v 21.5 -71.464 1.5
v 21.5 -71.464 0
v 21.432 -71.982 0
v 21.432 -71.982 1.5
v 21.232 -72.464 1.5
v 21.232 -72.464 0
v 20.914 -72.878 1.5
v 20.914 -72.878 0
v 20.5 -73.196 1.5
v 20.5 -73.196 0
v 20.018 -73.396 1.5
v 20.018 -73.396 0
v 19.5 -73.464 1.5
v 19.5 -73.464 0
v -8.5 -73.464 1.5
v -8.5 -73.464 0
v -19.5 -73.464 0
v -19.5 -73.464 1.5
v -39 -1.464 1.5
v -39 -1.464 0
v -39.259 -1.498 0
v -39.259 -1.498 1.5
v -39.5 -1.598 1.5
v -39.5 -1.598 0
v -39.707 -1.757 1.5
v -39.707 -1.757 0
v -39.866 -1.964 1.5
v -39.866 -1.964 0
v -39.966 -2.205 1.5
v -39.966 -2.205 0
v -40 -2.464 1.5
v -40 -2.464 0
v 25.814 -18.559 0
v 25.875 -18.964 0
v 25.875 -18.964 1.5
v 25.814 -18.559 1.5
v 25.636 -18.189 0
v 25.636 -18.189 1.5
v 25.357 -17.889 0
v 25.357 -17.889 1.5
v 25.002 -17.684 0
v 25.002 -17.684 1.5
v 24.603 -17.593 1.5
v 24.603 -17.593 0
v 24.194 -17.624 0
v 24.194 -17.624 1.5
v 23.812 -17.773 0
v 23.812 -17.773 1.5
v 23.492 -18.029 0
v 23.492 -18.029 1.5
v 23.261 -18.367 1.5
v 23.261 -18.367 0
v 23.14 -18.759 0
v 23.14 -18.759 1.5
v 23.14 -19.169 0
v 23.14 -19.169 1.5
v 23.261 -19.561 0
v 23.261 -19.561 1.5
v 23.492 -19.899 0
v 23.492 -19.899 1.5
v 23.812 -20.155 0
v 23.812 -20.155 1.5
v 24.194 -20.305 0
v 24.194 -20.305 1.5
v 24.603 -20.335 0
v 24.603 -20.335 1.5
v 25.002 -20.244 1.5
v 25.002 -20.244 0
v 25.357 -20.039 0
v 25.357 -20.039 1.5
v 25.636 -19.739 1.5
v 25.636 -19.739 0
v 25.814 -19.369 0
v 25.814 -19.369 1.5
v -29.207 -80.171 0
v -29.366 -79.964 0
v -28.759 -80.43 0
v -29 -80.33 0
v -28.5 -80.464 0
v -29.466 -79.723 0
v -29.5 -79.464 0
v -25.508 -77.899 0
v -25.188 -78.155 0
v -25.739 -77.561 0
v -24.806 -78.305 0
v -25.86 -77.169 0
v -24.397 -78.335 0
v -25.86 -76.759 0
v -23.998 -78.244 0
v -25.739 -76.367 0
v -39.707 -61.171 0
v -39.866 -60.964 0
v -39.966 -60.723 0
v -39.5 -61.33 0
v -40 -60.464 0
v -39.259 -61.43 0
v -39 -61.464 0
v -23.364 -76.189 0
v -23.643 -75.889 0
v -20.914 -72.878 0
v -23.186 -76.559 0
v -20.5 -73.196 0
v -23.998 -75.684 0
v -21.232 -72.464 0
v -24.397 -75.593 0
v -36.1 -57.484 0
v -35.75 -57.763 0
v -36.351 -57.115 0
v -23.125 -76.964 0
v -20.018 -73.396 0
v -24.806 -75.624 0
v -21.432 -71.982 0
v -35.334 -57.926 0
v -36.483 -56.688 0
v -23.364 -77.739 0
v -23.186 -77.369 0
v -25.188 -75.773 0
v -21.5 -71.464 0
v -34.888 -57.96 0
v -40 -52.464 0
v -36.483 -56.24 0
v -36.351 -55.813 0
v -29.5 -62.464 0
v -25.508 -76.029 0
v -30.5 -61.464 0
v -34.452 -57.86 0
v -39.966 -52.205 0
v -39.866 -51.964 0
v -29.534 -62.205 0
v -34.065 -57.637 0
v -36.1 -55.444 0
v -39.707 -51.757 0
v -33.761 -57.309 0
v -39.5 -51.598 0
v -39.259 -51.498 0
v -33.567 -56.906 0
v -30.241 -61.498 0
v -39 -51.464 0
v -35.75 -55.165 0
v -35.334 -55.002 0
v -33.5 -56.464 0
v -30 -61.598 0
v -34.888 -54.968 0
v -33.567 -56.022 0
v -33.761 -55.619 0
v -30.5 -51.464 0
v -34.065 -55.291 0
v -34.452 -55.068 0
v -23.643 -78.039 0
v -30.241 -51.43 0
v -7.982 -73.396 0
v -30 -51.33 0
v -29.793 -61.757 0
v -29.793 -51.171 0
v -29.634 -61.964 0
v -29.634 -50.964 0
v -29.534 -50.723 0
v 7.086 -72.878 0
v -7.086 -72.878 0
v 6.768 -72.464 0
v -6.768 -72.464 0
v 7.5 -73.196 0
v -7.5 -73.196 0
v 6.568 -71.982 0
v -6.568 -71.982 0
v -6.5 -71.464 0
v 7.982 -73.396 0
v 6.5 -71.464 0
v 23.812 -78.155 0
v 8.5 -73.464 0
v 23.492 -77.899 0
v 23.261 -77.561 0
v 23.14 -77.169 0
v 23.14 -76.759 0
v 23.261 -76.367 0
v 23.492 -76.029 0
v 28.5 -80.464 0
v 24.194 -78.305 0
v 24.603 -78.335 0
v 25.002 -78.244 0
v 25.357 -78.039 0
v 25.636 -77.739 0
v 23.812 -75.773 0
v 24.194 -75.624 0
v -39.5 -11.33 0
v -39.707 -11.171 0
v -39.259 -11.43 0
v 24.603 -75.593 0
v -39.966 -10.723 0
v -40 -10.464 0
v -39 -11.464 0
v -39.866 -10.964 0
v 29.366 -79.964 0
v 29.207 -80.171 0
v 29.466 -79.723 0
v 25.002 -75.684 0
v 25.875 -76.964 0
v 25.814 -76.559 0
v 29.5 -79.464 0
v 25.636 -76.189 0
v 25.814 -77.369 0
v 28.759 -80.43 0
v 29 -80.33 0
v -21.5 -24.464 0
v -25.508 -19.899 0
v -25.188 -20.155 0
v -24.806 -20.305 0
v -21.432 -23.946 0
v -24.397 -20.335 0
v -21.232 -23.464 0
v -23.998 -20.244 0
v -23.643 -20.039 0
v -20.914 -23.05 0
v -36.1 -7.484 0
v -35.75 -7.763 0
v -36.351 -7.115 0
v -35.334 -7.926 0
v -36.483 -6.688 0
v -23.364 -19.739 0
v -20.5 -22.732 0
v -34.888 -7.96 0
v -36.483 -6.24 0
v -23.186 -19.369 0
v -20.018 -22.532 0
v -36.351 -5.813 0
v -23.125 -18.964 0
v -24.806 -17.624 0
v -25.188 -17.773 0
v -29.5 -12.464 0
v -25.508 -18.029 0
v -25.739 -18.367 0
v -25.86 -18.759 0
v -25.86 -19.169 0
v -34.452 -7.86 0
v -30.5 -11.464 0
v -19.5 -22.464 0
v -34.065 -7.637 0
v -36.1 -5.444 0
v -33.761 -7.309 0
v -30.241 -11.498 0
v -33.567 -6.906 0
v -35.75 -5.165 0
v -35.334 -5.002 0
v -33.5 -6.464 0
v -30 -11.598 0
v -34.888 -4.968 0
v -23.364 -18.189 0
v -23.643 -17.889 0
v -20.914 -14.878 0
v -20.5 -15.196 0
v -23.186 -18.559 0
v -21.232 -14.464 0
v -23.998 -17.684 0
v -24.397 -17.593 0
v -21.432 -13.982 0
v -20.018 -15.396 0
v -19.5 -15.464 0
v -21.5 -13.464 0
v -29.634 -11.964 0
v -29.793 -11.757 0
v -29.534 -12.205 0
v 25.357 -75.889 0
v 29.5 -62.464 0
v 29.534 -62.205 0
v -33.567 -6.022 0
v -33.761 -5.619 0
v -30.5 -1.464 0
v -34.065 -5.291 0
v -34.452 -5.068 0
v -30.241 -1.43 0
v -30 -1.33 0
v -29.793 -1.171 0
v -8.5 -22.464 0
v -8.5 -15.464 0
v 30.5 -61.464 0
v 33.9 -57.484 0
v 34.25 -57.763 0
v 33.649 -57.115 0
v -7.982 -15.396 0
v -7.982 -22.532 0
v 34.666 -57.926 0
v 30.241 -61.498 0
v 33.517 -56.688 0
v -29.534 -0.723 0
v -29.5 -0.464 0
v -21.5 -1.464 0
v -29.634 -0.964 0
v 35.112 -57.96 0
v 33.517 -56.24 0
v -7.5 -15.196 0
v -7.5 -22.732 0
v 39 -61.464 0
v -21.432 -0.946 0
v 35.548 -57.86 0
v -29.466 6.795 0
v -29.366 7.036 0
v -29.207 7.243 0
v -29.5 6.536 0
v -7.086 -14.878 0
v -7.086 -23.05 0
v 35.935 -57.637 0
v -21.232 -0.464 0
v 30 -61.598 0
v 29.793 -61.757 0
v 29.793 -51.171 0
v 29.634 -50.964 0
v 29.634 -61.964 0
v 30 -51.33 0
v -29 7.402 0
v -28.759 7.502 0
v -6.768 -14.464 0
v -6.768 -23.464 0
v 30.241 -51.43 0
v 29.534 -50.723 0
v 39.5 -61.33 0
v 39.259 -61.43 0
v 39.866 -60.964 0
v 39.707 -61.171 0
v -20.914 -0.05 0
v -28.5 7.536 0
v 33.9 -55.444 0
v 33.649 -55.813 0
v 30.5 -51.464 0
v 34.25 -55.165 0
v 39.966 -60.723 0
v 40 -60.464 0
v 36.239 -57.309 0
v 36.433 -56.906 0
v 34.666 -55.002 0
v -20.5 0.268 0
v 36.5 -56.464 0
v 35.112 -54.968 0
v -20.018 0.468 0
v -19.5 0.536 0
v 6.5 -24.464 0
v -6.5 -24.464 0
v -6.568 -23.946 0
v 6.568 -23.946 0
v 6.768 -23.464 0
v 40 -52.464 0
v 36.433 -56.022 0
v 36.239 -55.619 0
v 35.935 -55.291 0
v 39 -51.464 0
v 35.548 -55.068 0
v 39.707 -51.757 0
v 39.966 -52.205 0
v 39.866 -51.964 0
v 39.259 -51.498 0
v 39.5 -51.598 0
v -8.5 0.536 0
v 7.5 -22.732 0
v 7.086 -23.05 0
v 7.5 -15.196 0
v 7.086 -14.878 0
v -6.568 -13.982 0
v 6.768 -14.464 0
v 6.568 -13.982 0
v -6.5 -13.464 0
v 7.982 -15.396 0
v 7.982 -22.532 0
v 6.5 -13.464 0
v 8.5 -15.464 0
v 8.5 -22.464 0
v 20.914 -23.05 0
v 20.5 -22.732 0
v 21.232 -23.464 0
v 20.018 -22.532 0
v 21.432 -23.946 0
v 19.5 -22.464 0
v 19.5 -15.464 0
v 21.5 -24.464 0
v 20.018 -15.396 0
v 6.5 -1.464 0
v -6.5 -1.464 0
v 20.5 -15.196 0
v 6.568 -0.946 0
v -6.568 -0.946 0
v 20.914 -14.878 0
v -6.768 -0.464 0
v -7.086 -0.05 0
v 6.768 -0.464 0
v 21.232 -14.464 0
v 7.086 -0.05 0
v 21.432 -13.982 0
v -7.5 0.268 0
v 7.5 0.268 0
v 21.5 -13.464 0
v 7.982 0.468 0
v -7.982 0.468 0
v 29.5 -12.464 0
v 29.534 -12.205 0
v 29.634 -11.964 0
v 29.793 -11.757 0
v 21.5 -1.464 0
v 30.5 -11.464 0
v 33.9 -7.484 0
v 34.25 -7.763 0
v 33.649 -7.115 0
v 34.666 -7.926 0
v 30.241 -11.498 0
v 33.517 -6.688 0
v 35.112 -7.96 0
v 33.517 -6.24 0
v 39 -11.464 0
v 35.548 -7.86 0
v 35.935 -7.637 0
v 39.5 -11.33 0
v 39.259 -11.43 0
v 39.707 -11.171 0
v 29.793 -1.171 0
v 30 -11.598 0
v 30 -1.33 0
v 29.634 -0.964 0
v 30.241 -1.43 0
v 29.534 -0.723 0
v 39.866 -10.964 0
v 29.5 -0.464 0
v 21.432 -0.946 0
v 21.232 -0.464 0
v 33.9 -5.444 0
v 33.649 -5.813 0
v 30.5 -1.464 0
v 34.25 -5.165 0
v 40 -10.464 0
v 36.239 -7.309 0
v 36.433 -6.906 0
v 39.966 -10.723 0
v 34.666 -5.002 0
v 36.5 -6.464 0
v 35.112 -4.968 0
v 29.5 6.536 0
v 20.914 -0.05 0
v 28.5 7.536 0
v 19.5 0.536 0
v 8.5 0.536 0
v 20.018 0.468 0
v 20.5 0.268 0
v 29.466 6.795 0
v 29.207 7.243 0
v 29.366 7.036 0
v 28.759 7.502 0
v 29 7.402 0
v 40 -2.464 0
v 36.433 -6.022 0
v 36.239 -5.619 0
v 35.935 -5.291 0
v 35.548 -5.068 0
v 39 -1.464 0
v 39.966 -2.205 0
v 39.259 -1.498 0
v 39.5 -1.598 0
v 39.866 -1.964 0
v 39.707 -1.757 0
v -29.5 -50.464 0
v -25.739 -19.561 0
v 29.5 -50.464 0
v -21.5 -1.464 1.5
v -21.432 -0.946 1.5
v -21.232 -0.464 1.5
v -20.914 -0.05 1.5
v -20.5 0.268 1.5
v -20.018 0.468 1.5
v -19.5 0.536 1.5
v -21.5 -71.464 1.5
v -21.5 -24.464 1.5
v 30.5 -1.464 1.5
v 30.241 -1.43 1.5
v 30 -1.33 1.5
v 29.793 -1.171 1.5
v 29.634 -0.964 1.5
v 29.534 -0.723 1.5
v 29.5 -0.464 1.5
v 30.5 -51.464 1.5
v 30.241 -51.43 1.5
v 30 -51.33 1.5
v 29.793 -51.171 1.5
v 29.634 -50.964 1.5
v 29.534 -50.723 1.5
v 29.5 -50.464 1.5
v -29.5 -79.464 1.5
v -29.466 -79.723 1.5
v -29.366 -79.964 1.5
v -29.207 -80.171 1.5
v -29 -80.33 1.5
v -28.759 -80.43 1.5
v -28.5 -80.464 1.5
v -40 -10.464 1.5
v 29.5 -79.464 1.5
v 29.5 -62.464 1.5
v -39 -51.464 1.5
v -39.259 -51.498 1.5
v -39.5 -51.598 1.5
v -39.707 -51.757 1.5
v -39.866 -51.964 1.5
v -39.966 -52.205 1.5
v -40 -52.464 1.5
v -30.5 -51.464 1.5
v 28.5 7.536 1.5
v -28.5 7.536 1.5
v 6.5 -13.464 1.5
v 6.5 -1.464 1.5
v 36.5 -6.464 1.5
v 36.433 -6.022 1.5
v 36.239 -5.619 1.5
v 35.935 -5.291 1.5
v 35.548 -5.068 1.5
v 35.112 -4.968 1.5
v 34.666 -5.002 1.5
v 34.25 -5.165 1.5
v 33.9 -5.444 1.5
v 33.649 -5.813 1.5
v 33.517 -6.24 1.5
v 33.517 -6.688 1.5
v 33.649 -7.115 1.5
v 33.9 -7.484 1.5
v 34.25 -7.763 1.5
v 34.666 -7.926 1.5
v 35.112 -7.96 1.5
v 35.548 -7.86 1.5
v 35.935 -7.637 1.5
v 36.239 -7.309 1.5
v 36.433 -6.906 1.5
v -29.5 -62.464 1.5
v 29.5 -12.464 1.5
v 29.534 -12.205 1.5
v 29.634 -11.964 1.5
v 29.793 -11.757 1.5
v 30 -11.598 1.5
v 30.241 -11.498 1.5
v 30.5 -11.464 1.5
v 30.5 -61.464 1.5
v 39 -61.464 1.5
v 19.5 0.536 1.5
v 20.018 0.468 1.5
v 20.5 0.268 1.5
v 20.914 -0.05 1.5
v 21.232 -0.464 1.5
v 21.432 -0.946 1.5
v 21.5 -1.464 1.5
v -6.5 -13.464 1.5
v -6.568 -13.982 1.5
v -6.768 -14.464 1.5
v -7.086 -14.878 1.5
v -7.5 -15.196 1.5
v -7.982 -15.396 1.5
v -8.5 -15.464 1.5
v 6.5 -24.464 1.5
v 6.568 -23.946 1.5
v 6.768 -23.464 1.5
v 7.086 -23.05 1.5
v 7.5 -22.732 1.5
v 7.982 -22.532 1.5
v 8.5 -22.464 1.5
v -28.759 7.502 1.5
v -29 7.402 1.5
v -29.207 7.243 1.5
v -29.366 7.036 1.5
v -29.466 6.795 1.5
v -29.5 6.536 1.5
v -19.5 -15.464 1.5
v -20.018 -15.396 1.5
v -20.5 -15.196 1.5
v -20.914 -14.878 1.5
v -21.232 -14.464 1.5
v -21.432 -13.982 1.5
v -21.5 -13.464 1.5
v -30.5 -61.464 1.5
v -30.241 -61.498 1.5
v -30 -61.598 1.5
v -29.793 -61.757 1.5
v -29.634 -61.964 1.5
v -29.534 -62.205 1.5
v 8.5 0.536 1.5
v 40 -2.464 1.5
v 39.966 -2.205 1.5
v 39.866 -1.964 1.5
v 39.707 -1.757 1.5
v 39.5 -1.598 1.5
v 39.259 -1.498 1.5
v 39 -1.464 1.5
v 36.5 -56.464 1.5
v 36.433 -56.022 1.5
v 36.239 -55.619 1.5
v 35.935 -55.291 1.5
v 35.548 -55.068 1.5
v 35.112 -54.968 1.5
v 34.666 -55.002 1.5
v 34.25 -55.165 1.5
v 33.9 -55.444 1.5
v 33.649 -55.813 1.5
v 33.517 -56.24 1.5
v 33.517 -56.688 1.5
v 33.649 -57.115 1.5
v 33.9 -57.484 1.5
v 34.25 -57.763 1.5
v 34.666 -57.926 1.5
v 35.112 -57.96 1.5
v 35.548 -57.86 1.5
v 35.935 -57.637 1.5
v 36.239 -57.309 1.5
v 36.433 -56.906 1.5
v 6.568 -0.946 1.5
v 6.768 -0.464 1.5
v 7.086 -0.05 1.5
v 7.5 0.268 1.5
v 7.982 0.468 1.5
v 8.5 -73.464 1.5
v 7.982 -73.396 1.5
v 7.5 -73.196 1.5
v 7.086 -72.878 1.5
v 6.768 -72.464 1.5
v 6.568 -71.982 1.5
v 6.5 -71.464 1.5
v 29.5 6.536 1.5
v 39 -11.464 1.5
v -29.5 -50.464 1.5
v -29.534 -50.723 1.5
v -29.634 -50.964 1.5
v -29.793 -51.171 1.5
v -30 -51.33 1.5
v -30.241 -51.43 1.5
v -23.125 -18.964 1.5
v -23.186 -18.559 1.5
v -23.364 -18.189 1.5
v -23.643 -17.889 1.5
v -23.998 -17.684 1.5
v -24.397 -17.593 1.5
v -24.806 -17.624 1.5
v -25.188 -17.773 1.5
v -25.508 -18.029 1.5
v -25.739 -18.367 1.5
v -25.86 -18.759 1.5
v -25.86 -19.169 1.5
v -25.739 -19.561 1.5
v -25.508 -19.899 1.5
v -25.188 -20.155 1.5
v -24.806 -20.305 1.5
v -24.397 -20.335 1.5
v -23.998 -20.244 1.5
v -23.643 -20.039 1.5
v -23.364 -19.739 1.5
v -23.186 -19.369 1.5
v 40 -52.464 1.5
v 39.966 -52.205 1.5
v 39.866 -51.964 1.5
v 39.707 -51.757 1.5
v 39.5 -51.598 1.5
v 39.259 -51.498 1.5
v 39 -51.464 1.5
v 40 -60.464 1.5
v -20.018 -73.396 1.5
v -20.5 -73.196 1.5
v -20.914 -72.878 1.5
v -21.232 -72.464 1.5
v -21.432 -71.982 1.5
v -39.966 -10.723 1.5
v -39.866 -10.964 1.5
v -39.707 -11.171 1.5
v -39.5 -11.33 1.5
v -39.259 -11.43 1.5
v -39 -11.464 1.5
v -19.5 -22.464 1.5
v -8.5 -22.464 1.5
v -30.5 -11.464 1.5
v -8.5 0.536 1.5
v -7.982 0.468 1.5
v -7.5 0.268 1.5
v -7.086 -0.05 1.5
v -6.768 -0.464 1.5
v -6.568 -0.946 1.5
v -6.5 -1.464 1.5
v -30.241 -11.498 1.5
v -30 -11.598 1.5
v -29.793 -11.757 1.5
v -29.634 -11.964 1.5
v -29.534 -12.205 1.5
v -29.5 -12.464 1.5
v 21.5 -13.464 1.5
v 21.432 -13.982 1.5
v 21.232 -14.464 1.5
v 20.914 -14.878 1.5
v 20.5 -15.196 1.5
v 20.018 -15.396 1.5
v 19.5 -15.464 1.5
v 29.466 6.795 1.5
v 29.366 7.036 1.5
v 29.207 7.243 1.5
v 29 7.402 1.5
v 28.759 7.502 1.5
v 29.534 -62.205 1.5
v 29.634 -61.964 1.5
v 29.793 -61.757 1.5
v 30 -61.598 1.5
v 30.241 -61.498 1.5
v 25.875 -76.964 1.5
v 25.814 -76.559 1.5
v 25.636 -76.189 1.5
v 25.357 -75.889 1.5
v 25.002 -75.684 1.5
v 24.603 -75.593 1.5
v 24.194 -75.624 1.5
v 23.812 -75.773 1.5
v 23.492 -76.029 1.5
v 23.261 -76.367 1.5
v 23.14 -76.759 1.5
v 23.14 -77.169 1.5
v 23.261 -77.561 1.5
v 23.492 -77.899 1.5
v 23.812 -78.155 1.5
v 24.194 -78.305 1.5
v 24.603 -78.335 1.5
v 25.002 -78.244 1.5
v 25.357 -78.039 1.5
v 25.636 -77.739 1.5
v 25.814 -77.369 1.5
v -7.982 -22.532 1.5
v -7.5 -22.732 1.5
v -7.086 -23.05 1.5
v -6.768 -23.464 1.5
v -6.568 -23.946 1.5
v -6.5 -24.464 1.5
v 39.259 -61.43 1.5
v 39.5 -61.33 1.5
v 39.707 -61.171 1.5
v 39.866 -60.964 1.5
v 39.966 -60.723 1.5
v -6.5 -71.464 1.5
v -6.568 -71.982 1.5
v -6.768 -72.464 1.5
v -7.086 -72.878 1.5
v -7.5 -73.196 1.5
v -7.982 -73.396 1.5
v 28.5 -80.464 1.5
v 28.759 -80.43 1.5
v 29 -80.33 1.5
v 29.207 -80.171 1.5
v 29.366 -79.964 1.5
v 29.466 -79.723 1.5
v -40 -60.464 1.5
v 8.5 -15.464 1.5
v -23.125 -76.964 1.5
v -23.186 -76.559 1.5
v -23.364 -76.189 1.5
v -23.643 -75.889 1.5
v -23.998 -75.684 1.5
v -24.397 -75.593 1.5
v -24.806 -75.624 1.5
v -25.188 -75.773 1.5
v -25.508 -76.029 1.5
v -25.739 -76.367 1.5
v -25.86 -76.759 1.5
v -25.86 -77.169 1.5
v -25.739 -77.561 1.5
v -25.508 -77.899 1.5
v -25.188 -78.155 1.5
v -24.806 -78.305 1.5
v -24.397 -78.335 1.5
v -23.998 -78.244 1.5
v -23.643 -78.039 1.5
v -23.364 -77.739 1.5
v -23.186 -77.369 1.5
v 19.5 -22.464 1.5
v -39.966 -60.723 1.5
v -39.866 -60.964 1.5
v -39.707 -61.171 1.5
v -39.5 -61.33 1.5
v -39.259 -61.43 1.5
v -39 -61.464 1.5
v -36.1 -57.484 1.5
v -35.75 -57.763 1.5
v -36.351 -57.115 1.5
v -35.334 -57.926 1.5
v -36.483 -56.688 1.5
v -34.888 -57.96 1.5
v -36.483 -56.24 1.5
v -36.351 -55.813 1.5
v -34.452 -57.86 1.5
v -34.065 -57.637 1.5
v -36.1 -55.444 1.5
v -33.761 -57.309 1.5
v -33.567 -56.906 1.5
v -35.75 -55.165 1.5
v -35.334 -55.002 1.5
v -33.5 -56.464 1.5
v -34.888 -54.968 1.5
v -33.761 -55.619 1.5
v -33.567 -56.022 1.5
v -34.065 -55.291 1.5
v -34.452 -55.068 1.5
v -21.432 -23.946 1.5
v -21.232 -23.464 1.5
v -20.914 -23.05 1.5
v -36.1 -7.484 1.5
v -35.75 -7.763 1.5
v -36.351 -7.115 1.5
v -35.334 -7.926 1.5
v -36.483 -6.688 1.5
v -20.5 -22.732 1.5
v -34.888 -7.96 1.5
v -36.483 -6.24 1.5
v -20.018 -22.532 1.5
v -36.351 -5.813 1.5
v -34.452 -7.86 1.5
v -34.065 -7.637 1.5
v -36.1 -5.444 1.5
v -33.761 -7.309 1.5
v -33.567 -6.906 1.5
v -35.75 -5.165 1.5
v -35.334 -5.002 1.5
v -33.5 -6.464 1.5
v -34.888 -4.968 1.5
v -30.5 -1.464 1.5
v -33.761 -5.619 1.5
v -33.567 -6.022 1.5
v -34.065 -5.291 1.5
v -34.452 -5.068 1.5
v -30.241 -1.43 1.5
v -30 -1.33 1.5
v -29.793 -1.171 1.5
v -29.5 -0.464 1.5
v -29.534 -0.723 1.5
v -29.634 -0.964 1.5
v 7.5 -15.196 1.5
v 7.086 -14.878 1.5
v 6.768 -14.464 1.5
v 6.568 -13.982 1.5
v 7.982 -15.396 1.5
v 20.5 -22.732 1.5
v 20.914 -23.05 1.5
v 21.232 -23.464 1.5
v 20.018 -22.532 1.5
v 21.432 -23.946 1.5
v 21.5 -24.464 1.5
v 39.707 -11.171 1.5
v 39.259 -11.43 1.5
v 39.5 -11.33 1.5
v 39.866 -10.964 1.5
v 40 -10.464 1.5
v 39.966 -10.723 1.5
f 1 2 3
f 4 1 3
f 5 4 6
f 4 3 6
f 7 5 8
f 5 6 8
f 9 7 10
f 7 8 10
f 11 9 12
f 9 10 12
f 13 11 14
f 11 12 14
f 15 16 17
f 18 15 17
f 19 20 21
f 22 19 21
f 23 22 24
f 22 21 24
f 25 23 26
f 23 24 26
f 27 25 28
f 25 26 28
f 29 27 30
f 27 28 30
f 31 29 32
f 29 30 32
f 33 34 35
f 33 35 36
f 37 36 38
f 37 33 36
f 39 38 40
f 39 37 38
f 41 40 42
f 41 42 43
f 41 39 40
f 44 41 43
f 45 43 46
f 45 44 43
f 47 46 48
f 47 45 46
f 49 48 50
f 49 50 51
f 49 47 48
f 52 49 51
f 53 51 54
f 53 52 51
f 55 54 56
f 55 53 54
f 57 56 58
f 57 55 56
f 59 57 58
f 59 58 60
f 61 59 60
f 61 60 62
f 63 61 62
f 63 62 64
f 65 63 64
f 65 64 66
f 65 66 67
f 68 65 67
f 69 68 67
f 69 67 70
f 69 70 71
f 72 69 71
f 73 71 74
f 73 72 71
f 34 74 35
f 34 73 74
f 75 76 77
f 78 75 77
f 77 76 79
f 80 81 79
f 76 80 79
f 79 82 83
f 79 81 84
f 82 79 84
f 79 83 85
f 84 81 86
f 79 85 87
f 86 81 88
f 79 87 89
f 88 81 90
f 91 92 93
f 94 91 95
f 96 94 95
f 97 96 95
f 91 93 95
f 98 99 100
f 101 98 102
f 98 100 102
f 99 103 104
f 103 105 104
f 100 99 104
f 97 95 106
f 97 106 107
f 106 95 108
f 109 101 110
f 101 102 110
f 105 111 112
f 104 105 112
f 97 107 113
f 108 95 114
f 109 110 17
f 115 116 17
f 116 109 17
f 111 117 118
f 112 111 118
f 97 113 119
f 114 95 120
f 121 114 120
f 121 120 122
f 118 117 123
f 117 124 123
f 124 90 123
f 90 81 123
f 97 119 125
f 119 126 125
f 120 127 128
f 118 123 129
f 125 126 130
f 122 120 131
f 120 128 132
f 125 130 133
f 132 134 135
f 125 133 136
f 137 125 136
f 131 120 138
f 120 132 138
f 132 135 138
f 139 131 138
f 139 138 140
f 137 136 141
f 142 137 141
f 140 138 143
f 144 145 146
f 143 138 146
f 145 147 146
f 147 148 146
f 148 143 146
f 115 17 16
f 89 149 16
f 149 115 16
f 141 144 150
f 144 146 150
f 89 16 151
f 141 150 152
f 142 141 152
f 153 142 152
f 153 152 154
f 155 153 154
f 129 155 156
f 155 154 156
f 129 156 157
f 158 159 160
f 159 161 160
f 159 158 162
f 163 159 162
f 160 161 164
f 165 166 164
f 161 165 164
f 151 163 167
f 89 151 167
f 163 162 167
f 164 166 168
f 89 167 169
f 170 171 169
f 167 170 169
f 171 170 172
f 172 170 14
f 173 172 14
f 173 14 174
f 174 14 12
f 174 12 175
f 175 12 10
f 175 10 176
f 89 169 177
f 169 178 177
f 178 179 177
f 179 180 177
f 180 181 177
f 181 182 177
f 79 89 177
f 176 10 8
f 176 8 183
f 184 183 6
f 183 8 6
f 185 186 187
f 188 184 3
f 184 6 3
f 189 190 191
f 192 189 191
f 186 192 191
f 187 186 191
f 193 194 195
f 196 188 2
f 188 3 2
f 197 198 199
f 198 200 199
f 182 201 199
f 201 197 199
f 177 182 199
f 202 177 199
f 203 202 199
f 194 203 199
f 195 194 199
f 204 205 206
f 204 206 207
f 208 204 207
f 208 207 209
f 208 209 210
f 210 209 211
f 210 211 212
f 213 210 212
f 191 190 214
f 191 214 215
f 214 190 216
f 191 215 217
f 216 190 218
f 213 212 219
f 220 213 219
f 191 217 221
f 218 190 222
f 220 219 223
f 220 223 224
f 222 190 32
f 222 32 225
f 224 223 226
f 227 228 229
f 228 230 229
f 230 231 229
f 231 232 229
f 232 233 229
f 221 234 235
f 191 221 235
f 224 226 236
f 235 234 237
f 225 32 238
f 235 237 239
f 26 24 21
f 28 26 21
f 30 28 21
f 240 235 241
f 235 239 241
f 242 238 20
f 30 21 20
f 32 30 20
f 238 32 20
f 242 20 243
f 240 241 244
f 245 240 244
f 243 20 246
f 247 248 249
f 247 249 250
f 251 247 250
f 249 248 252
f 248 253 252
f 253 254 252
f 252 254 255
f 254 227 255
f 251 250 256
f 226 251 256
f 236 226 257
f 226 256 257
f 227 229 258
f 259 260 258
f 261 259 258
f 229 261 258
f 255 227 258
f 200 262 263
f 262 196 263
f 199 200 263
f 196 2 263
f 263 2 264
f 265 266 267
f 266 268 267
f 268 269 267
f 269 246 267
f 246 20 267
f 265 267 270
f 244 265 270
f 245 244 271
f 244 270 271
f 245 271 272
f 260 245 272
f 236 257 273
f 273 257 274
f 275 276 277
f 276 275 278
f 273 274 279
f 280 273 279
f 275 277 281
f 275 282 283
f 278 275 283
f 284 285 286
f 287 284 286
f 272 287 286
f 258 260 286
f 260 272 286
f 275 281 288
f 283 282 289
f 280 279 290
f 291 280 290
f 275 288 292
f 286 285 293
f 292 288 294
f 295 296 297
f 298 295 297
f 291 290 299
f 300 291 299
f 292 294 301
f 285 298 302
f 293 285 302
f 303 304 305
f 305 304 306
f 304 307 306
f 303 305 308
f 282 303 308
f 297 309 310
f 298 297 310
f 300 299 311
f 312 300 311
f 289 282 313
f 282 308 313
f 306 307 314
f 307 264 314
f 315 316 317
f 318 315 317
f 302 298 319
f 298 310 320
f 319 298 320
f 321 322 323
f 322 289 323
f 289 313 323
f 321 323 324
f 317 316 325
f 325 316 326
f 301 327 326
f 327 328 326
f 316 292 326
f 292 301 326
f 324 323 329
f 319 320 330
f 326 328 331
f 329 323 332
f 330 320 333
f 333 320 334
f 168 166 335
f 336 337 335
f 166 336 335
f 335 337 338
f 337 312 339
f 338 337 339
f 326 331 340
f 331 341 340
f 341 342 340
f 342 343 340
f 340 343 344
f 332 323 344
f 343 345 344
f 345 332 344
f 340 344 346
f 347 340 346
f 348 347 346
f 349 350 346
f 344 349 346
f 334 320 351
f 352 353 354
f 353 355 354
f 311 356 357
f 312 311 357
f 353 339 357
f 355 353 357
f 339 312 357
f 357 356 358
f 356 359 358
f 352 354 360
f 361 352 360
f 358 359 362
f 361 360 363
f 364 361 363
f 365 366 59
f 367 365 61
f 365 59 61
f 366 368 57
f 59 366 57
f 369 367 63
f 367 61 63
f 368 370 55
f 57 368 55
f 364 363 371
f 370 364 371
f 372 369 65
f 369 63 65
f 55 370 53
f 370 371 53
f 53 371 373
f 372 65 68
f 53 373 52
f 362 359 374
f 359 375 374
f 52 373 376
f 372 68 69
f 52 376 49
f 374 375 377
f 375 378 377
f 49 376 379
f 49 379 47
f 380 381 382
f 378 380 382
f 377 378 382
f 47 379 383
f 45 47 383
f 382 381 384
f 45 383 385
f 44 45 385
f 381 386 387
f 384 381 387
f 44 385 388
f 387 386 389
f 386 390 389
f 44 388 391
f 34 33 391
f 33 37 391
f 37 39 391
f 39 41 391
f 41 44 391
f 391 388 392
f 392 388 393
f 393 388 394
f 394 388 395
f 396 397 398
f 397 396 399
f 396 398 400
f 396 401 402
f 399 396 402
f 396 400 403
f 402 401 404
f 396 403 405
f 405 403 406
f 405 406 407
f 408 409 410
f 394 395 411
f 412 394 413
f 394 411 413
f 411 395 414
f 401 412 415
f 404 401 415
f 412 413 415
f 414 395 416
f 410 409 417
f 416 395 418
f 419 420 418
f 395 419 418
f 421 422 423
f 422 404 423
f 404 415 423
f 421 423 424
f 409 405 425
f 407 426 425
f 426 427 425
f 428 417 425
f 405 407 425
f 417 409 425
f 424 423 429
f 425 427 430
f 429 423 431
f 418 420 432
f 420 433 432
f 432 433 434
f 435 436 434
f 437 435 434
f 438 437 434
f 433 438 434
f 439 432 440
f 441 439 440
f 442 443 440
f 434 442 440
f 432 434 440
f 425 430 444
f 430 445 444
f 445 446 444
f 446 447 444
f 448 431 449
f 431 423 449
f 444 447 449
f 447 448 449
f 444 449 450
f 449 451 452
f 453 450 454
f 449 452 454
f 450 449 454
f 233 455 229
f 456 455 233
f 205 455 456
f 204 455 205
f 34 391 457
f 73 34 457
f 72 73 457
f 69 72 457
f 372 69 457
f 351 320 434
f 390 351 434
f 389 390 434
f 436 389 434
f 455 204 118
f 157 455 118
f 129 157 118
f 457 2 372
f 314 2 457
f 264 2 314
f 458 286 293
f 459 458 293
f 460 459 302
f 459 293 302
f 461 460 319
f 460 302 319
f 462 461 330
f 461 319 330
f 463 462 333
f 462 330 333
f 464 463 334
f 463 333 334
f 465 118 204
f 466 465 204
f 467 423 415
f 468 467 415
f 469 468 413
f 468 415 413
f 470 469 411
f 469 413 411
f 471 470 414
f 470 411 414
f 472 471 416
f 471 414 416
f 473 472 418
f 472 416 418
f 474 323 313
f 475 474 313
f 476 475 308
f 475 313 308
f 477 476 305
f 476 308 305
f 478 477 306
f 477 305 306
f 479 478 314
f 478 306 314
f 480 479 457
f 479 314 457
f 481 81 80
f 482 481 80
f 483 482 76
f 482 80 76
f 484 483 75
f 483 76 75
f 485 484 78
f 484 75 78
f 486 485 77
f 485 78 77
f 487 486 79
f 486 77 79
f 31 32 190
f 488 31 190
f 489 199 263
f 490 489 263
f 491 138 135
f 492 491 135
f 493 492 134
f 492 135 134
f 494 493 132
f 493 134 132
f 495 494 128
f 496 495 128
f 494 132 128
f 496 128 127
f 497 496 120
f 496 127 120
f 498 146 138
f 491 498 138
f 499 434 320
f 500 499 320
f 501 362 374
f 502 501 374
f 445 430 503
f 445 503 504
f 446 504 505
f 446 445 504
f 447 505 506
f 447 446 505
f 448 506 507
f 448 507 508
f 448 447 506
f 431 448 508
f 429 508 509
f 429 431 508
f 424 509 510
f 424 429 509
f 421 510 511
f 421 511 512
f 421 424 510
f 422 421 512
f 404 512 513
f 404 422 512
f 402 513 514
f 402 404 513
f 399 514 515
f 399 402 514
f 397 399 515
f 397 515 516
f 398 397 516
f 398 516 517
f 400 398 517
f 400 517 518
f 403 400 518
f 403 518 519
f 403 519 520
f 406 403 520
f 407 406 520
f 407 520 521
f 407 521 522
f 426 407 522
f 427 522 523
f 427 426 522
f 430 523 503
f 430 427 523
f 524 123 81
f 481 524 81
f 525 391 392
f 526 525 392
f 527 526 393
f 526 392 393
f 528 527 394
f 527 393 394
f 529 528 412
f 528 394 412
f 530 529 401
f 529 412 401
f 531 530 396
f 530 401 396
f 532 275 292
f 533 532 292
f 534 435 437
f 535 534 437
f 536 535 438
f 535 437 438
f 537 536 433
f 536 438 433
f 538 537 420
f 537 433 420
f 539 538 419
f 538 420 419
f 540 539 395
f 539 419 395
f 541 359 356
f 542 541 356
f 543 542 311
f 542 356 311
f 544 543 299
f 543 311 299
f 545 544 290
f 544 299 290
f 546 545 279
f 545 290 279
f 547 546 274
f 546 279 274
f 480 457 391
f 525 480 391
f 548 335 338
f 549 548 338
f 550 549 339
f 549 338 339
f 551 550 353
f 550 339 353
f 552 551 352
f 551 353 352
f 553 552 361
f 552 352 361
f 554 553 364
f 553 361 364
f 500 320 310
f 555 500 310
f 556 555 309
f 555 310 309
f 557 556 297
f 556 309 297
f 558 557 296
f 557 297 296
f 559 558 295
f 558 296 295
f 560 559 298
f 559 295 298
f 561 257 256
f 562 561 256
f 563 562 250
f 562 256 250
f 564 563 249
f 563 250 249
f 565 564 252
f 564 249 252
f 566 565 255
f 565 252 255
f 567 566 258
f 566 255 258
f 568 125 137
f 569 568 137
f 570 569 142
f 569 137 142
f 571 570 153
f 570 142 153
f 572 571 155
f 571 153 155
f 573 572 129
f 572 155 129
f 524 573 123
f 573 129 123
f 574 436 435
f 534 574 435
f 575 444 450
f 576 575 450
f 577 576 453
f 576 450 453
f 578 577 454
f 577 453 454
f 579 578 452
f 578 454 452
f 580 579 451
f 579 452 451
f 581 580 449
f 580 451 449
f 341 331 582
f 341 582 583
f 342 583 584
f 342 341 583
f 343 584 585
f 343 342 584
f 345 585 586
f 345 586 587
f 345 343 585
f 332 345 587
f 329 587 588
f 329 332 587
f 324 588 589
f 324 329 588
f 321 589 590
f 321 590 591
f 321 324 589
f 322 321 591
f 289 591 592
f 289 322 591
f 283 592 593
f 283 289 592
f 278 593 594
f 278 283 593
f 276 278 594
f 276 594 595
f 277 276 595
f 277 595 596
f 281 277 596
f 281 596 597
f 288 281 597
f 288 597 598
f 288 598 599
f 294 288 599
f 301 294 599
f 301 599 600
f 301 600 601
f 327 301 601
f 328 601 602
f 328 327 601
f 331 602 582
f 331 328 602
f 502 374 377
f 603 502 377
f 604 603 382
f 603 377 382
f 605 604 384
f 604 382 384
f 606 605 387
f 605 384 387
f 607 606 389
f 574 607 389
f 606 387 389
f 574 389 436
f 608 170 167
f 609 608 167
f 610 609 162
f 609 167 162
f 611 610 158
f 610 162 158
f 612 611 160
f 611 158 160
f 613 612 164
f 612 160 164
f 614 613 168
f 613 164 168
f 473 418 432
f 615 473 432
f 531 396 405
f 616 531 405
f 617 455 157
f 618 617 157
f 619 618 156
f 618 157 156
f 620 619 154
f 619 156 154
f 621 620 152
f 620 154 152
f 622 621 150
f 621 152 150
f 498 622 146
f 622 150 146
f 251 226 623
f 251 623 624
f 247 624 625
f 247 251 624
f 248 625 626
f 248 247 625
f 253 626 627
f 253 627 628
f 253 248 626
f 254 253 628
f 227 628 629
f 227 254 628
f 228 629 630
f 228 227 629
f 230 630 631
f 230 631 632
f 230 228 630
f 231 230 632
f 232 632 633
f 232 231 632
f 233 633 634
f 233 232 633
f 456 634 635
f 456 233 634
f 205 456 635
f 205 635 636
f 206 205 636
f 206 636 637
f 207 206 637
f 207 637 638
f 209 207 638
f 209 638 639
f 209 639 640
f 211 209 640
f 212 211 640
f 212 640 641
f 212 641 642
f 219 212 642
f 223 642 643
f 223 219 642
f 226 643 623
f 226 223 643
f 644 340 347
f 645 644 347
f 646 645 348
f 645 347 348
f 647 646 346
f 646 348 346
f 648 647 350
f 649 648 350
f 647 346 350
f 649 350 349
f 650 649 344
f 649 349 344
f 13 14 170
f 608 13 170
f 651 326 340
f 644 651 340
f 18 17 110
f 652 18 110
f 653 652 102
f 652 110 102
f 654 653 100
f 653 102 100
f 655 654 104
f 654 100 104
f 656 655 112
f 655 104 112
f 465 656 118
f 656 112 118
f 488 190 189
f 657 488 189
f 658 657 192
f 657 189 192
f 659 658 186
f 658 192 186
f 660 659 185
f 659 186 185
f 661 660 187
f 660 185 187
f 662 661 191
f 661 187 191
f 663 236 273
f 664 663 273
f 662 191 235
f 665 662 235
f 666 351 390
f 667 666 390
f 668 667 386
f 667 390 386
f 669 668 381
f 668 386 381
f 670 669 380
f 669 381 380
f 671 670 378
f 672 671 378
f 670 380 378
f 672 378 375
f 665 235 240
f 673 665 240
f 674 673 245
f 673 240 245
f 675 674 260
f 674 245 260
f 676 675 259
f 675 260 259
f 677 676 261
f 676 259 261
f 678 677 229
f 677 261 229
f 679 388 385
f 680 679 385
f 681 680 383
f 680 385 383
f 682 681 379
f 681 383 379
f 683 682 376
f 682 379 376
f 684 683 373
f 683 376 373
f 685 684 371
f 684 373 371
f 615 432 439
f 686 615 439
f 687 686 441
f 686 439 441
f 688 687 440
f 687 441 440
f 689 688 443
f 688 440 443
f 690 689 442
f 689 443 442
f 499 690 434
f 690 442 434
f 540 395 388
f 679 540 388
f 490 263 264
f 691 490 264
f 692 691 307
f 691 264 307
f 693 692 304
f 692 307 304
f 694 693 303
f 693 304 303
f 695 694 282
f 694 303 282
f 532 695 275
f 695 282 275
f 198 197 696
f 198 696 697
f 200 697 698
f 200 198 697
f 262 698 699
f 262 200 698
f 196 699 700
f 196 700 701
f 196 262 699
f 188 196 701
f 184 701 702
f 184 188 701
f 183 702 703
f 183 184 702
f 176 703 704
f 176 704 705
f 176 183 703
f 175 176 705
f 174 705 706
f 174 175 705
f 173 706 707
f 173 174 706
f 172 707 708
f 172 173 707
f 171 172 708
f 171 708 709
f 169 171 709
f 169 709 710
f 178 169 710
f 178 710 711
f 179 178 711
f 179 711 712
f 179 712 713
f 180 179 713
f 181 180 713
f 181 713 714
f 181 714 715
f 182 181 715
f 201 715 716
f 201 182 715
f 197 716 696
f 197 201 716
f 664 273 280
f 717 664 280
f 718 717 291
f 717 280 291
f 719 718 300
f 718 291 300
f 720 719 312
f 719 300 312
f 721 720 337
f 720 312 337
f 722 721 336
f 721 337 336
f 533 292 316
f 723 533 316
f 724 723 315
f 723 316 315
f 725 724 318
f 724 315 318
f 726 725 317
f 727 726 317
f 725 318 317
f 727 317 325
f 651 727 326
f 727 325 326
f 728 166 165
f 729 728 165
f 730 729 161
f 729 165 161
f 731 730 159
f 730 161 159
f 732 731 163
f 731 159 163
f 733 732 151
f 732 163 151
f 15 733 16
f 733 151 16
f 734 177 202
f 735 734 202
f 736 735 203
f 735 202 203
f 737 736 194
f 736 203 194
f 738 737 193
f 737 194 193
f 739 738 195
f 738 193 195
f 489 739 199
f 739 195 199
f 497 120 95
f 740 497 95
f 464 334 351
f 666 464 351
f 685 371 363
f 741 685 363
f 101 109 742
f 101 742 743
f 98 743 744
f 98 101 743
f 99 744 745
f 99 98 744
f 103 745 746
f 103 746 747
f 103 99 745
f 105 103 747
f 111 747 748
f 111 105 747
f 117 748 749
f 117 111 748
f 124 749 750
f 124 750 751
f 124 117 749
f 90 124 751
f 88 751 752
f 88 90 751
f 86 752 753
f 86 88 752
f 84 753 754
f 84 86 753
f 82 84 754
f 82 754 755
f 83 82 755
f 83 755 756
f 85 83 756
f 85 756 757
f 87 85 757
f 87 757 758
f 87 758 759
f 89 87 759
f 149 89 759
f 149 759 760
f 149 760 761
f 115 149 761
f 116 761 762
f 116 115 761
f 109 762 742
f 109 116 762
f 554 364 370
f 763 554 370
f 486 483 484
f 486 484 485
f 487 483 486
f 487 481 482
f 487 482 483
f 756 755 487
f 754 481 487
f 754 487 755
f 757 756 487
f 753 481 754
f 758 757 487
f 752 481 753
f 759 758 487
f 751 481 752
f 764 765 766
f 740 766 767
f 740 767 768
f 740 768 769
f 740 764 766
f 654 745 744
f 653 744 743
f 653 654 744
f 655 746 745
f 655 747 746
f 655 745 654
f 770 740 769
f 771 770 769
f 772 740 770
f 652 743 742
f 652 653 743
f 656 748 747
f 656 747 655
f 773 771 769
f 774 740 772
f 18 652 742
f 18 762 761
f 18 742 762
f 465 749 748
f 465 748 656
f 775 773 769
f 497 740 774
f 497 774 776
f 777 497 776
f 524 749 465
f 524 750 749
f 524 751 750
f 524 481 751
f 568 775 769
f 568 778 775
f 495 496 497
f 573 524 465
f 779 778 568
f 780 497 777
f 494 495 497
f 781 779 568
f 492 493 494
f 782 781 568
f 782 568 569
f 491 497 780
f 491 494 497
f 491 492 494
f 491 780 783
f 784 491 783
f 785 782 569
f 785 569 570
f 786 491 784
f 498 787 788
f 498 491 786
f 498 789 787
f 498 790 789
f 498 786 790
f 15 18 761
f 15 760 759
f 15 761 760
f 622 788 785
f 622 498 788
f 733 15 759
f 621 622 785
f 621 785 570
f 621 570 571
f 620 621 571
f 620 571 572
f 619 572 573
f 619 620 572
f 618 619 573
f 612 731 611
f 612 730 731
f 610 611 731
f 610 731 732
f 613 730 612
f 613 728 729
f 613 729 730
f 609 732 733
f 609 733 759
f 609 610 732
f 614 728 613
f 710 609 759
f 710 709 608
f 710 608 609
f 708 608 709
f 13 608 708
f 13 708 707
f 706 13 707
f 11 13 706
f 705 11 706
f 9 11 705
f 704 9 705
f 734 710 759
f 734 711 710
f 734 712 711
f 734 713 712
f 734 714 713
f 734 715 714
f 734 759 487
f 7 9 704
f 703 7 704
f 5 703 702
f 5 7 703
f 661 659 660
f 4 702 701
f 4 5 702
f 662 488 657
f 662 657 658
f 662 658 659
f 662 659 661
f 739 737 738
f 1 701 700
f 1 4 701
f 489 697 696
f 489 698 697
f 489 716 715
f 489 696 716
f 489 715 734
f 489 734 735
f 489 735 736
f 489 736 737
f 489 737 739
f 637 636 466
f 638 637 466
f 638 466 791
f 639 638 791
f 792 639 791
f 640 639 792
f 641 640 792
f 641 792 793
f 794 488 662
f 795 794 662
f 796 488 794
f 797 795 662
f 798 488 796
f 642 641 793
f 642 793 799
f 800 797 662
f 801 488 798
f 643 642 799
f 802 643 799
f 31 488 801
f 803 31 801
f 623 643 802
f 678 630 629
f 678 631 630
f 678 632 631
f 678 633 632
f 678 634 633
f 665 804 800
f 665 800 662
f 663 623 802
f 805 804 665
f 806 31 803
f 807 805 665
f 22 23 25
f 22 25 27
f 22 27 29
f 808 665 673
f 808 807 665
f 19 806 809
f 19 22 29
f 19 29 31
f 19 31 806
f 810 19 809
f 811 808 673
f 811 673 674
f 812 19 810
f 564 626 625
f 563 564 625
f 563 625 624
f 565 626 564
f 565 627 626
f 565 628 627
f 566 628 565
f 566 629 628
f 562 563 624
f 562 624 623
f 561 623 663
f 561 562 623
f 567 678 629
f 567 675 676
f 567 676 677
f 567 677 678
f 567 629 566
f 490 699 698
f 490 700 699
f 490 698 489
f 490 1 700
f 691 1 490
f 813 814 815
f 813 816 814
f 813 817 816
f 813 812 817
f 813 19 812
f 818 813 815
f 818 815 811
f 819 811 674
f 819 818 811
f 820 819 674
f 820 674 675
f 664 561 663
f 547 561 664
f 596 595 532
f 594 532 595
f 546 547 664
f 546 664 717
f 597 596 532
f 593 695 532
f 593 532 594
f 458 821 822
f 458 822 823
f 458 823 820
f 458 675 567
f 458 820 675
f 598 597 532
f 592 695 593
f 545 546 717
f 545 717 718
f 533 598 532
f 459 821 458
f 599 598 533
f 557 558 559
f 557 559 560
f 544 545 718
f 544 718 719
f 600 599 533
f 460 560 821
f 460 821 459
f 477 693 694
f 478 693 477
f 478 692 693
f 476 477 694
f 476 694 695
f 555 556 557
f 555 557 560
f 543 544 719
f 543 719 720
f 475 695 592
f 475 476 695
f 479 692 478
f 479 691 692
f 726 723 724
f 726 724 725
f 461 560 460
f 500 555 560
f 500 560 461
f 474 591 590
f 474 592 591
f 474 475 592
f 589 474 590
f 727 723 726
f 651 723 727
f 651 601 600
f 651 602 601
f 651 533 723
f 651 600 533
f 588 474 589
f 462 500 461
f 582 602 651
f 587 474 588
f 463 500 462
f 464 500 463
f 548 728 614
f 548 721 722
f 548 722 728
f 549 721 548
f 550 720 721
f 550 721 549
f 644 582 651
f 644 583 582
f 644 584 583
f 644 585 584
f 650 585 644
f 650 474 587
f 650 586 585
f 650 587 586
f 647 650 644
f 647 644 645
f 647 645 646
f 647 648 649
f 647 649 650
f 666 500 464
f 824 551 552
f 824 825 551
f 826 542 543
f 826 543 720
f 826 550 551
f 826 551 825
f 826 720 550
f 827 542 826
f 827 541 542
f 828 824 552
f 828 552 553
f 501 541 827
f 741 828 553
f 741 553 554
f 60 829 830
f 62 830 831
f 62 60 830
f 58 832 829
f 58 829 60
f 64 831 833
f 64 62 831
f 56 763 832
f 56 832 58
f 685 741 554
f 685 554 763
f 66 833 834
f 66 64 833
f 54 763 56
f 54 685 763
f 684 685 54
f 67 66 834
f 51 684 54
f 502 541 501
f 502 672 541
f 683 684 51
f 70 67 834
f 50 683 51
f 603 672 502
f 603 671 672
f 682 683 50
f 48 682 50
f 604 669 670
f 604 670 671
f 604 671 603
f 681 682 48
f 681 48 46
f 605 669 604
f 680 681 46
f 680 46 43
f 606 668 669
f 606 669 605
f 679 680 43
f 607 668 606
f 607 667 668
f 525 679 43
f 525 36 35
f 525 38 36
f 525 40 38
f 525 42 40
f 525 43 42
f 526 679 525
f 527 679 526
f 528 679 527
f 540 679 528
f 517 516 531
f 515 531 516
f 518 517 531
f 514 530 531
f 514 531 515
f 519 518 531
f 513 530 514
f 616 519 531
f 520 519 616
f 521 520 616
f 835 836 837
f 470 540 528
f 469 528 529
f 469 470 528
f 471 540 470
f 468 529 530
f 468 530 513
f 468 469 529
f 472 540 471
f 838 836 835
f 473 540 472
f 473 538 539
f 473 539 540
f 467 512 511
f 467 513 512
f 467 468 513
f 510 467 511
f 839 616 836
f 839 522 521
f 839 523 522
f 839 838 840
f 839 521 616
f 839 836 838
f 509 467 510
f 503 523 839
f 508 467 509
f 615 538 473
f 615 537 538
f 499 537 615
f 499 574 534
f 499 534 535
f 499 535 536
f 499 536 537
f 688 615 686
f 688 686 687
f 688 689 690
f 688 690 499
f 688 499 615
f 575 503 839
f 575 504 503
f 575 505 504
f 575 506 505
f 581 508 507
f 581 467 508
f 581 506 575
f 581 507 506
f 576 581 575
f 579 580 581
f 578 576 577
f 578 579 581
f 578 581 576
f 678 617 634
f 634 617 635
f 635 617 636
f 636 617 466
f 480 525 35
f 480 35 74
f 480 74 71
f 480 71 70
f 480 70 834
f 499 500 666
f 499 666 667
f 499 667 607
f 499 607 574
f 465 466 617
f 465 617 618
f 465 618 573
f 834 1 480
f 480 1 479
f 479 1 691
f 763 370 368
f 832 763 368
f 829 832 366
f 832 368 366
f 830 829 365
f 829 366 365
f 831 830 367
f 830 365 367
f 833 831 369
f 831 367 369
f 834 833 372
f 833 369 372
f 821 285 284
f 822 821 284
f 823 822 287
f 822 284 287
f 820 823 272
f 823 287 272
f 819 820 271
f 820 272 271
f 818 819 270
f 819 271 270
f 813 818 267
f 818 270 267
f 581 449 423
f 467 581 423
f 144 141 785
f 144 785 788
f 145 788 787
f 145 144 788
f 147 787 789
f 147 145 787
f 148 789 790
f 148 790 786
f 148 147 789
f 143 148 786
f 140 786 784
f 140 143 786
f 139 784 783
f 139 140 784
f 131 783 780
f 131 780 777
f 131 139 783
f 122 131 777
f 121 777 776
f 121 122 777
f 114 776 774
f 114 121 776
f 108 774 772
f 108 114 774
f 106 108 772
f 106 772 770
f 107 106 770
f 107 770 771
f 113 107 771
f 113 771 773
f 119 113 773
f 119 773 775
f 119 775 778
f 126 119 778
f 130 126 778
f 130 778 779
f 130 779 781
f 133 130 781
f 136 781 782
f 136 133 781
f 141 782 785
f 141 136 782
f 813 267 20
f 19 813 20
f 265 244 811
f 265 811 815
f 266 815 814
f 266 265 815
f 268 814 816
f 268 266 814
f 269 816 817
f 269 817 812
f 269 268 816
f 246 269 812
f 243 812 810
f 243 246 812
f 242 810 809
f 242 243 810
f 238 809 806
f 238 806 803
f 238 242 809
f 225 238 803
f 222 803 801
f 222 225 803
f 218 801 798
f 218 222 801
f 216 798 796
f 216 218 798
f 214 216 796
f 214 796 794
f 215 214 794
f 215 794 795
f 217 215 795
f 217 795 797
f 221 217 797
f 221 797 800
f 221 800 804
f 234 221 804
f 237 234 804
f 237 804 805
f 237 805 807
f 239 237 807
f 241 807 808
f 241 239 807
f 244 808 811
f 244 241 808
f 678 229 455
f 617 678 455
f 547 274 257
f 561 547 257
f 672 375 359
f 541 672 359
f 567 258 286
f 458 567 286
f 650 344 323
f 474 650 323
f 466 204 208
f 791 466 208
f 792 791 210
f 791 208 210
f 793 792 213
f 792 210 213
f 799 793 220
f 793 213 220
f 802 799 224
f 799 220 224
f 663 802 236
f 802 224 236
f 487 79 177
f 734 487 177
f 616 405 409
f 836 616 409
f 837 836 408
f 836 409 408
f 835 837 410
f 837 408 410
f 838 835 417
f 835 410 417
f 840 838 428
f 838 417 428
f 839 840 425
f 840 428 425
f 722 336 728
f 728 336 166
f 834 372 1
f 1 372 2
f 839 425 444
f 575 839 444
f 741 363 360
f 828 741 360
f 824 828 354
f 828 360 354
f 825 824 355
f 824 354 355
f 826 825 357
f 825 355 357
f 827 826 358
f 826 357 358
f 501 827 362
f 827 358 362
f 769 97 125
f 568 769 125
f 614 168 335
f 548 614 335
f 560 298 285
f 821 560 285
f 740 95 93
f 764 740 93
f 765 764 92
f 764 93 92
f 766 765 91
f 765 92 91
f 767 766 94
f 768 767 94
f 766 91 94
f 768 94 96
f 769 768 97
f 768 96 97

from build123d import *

# Parameters (mm, degrees)
MODEL_R         = 1.375
MODEL_R_2       = 1.5
EXTRUDE_1_DEPTH = 1.5


with BuildPart() as part:
    # Model → Бобышка-Вытянуть1 (new body)
    with BuildSketch(Plane.XY):
        with BuildLine():
            ThreePointArc((-28.5, 7.535944945), (-29.207106781, 7.243051726), (-29.5, 6.535944945))
            Line((-29.5, 6.535944945), (-29.5, -0.464055055))
            ThreePointArc((-29.5, -0.464055055), (-29.792893219, -1.171161836), (-30.5, -1.464055055))
            Line((-30.5, -1.464055055), (-39, -1.464055055))
            ThreePointArc((-39, -1.464055055), (-39.707106781, -1.756948274), (-40, -2.464055055))
            Line((-40, -2.464055055), (-40, -10.464055055))
            ThreePointArc((-40, -10.464055055), (-39.707106781, -11.171161836), (-39, -11.464055055))
            Line((-39, -11.464055055), (-30.5, -11.464055055))
            ThreePointArc((-30.5, -11.464055055), (-29.792893219, -11.756948274), (-29.5, -12.464055055))
            Line((-29.5, -12.464055055), (-29.5, -50.464055055))
            ThreePointArc((-29.5, -50.464055055), (-29.792893219, -51.171161836), (-30.5, -51.464055055))
            Line((-30.5, -51.464055055), (-39, -51.464055055))
            ThreePointArc((-39, -51.464055055), (-39.707106781, -51.756948274), (-40, -52.464055055))
            Line((-40, -52.464055055), (-40, -60.464055055))
            ThreePointArc((-40, -60.464055055), (-39.707106781, -61.171161836), (-39, -61.464055055))
            Line((-39, -61.464055055), (-30.5, -61.464055055))
            ThreePointArc((-30.5, -61.464055055), (-29.792893219, -61.756948274), (-29.5, -62.464055055))
            Line((-29.5, -62.464055055), (-29.5, -79.464055055))
            ThreePointArc((-29.5, -79.464055055), (-29.207106781, -80.171161836), (-28.5, -80.464055055))
            Line((-28.5, -80.464055055), (28.5, -80.464055055))
            ThreePointArc((28.5, -80.464055055), (29.207106781, -80.171161836), (29.5, -79.464055055))
            Line((29.5, -79.464055055), (29.5, -62.464055055))
            ThreePointArc((29.5, -62.464055055), (29.792893219, -61.756948274), (30.5, -61.464055055))
            Line((30.5, -61.464055055), (39, -61.464055055))
            ThreePointArc((39, -61.464055055), (39.707106781, -61.171161836), (40, -60.464055055))
            Line((40, -60.464055055), (40, -52.464055055))
            ThreePointArc((40, -52.464055055), (39.707106781, -51.756948274), (39, -51.464055055))
            Line((39, -51.464055055), (30.5, -51.464055055))
            ThreePointArc((30.5, -51.464055055), (29.792893219, -51.171161836), (29.5, -50.464055055))
            Line((29.5, -50.464055055), (29.5, -12.464055055))
            ThreePointArc((29.5, -12.464055055), (29.792893219, -11.756948274), (30.5, -11.464055055))
            Line((30.5, -11.464055055), (39, -11.464055055))
            ThreePointArc((39, -11.464055055), (39.707106781, -11.171161836), (40, -10.464055055))
            Line((40, -10.464055055), (40, -2.464055055))
            ThreePointArc((40, -2.464055055), (39.707106781, -1.756948274), (39, -1.464055055))
            Line((39, -1.464055055), (30.5, -1.464055055))
            ThreePointArc((30.5, -1.464055055), (29.792893219, -1.171161836), (29.5, -0.464055055))
            Line((29.5, -0.464055055), (29.5, 6.535944945))
            ThreePointArc((29.5, 6.535944945), (29.207106781, 7.243051726), (28.5, 7.535944945))
            Line((28.5, 7.535944945), (-28.5, 7.535944945))
        make_face()
        with Locations((-24.5, -76.964055055)):
            Circle(MODEL_R, mode=Mode.SUBTRACT)
        with Locations((-35, -56.464055055)):
            Circle(MODEL_R_2, mode=Mode.SUBTRACT)
        with BuildLine():
            ThreePointArc((-21.5, -24.464055055), (-20.914213562, -23.049841493), (-19.5, -22.464055055))
            Line((-19.5, -22.464055055), (-8.5, -22.464055055))
            ThreePointArc((-8.5, -22.464055055), (-7.085786438, -23.049841493), (-6.5, -24.464055055))
            Line((-6.5, -24.464055055), (-6.5, -71.464055055))
            ThreePointArc((-6.5, -71.464055055), (-7.085786438, -72.878268617), (-8.5, -73.464055055))
            Line((-8.5, -73.464055055), (-19.5, -73.464055055))
            ThreePointArc((-19.5, -73.464055055), (-20.914213562, -72.878268617), (-21.5, -71.464055055))
            Line((-21.5, -71.464055055), (-21.5, -24.464055055))
        make_face(mode=Mode.SUBTRACT)
        with Locations((-24.5, -18.964055055)):
            Circle(MODEL_R, mode=Mode.SUBTRACT)
        with Locations((-35, -6.464055055)):
            Circle(MODEL_R_2, mode=Mode.SUBTRACT)
        with BuildLine():
            Line((-8.5, -15.464055055), (-19.5, -15.464055055))
            ThreePointArc((-19.5, -15.464055055), (-20.914213562, -14.878268617), (-21.5, -13.464055055))
            Line((-21.5, -13.464055055), (-21.5, -1.464055055))
            ThreePointArc((-21.5, -1.464055055), (-20.914213562, -0.049841493), (-19.5, 0.535944945))
            Line((-19.5, 0.535944945), (-8.5, 0.535944945))
            ThreePointArc((-8.5, 0.535944945), (-7.085786438, -0.049841493), (-6.5, -1.464055055))
            Line((-6.5, -1.464055055), (-6.5, -13.464055055))
            ThreePointArc((-6.5, -13.464055055), (-7.085786438, -14.878268617), (-8.5, -15.464055055))
        make_face(mode=Mode.SUBTRACT)
        with Locations((24.5, -76.964055055)):
            Circle(MODEL_R, mode=Mode.SUBTRACT)
        with BuildLine():
            Line((21.5, -24.464055055), (21.5, -71.464055055))
            ThreePointArc((21.5, -71.464055055), (20.914213562, -72.878268617), (19.5, -73.464055055))
            Line((19.5, -73.464055055), (8.5, -73.464055055))
            ThreePointArc((8.5, -73.464055055), (7.085786438, -72.878268617), (6.5, -71.464055055))
            Line((6.5, -71.464055055), (6.5, -24.464055055))
            ThreePointArc((6.5, -24.464055055), (7.085786438, -23.049841493), (8.5, -22.464055055))
            Line((8.5, -22.464055055), (19.5, -22.464055055))
            ThreePointArc((19.5, -22.464055055), (20.914213562, -23.049841493), (21.5, -24.464055055))
        make_face(mode=Mode.SUBTRACT)
        with Locations((35, -56.464055055)):
            Circle(MODEL_R_2, mode=Mode.SUBTRACT)
        with Locations((24.5, -18.964055055)):
            Circle(MODEL_R, mode=Mode.SUBTRACT)
        with BuildLine():
            ThreePointArc((21.5, -13.464055055), (20.914213562, -14.878268617), (19.5, -15.464055055))
            Line((19.5, -15.464055055), (8.5, -15.464055055))
            ThreePointArc((8.5, -15.464055055), (7.085786438, -14.878268617), (6.5, -13.464055055))
            Line((6.5, -13.464055055), (6.5, -1.464055055))
            ThreePointArc((6.5, -1.464055055), (7.085786438, -0.049841493), (8.5, 0.535944945))
            Line((8.5, 0.535944945), (19.5, 0.535944945))
            ThreePointArc((19.5, 0.535944945), (20.914213562, -0.049841493), (21.5, -1.464055055))
            Line((21.5, -1.464055055), (21.5, -13.464055055))
        make_face(mode=Mode.SUBTRACT)
        with Locations((35, -6.464055055)):
            Circle(MODEL_R_2, mode=Mode.SUBTRACT)
    extrude(amount=EXTRUDE_1_DEPTH)


solid = part.part
